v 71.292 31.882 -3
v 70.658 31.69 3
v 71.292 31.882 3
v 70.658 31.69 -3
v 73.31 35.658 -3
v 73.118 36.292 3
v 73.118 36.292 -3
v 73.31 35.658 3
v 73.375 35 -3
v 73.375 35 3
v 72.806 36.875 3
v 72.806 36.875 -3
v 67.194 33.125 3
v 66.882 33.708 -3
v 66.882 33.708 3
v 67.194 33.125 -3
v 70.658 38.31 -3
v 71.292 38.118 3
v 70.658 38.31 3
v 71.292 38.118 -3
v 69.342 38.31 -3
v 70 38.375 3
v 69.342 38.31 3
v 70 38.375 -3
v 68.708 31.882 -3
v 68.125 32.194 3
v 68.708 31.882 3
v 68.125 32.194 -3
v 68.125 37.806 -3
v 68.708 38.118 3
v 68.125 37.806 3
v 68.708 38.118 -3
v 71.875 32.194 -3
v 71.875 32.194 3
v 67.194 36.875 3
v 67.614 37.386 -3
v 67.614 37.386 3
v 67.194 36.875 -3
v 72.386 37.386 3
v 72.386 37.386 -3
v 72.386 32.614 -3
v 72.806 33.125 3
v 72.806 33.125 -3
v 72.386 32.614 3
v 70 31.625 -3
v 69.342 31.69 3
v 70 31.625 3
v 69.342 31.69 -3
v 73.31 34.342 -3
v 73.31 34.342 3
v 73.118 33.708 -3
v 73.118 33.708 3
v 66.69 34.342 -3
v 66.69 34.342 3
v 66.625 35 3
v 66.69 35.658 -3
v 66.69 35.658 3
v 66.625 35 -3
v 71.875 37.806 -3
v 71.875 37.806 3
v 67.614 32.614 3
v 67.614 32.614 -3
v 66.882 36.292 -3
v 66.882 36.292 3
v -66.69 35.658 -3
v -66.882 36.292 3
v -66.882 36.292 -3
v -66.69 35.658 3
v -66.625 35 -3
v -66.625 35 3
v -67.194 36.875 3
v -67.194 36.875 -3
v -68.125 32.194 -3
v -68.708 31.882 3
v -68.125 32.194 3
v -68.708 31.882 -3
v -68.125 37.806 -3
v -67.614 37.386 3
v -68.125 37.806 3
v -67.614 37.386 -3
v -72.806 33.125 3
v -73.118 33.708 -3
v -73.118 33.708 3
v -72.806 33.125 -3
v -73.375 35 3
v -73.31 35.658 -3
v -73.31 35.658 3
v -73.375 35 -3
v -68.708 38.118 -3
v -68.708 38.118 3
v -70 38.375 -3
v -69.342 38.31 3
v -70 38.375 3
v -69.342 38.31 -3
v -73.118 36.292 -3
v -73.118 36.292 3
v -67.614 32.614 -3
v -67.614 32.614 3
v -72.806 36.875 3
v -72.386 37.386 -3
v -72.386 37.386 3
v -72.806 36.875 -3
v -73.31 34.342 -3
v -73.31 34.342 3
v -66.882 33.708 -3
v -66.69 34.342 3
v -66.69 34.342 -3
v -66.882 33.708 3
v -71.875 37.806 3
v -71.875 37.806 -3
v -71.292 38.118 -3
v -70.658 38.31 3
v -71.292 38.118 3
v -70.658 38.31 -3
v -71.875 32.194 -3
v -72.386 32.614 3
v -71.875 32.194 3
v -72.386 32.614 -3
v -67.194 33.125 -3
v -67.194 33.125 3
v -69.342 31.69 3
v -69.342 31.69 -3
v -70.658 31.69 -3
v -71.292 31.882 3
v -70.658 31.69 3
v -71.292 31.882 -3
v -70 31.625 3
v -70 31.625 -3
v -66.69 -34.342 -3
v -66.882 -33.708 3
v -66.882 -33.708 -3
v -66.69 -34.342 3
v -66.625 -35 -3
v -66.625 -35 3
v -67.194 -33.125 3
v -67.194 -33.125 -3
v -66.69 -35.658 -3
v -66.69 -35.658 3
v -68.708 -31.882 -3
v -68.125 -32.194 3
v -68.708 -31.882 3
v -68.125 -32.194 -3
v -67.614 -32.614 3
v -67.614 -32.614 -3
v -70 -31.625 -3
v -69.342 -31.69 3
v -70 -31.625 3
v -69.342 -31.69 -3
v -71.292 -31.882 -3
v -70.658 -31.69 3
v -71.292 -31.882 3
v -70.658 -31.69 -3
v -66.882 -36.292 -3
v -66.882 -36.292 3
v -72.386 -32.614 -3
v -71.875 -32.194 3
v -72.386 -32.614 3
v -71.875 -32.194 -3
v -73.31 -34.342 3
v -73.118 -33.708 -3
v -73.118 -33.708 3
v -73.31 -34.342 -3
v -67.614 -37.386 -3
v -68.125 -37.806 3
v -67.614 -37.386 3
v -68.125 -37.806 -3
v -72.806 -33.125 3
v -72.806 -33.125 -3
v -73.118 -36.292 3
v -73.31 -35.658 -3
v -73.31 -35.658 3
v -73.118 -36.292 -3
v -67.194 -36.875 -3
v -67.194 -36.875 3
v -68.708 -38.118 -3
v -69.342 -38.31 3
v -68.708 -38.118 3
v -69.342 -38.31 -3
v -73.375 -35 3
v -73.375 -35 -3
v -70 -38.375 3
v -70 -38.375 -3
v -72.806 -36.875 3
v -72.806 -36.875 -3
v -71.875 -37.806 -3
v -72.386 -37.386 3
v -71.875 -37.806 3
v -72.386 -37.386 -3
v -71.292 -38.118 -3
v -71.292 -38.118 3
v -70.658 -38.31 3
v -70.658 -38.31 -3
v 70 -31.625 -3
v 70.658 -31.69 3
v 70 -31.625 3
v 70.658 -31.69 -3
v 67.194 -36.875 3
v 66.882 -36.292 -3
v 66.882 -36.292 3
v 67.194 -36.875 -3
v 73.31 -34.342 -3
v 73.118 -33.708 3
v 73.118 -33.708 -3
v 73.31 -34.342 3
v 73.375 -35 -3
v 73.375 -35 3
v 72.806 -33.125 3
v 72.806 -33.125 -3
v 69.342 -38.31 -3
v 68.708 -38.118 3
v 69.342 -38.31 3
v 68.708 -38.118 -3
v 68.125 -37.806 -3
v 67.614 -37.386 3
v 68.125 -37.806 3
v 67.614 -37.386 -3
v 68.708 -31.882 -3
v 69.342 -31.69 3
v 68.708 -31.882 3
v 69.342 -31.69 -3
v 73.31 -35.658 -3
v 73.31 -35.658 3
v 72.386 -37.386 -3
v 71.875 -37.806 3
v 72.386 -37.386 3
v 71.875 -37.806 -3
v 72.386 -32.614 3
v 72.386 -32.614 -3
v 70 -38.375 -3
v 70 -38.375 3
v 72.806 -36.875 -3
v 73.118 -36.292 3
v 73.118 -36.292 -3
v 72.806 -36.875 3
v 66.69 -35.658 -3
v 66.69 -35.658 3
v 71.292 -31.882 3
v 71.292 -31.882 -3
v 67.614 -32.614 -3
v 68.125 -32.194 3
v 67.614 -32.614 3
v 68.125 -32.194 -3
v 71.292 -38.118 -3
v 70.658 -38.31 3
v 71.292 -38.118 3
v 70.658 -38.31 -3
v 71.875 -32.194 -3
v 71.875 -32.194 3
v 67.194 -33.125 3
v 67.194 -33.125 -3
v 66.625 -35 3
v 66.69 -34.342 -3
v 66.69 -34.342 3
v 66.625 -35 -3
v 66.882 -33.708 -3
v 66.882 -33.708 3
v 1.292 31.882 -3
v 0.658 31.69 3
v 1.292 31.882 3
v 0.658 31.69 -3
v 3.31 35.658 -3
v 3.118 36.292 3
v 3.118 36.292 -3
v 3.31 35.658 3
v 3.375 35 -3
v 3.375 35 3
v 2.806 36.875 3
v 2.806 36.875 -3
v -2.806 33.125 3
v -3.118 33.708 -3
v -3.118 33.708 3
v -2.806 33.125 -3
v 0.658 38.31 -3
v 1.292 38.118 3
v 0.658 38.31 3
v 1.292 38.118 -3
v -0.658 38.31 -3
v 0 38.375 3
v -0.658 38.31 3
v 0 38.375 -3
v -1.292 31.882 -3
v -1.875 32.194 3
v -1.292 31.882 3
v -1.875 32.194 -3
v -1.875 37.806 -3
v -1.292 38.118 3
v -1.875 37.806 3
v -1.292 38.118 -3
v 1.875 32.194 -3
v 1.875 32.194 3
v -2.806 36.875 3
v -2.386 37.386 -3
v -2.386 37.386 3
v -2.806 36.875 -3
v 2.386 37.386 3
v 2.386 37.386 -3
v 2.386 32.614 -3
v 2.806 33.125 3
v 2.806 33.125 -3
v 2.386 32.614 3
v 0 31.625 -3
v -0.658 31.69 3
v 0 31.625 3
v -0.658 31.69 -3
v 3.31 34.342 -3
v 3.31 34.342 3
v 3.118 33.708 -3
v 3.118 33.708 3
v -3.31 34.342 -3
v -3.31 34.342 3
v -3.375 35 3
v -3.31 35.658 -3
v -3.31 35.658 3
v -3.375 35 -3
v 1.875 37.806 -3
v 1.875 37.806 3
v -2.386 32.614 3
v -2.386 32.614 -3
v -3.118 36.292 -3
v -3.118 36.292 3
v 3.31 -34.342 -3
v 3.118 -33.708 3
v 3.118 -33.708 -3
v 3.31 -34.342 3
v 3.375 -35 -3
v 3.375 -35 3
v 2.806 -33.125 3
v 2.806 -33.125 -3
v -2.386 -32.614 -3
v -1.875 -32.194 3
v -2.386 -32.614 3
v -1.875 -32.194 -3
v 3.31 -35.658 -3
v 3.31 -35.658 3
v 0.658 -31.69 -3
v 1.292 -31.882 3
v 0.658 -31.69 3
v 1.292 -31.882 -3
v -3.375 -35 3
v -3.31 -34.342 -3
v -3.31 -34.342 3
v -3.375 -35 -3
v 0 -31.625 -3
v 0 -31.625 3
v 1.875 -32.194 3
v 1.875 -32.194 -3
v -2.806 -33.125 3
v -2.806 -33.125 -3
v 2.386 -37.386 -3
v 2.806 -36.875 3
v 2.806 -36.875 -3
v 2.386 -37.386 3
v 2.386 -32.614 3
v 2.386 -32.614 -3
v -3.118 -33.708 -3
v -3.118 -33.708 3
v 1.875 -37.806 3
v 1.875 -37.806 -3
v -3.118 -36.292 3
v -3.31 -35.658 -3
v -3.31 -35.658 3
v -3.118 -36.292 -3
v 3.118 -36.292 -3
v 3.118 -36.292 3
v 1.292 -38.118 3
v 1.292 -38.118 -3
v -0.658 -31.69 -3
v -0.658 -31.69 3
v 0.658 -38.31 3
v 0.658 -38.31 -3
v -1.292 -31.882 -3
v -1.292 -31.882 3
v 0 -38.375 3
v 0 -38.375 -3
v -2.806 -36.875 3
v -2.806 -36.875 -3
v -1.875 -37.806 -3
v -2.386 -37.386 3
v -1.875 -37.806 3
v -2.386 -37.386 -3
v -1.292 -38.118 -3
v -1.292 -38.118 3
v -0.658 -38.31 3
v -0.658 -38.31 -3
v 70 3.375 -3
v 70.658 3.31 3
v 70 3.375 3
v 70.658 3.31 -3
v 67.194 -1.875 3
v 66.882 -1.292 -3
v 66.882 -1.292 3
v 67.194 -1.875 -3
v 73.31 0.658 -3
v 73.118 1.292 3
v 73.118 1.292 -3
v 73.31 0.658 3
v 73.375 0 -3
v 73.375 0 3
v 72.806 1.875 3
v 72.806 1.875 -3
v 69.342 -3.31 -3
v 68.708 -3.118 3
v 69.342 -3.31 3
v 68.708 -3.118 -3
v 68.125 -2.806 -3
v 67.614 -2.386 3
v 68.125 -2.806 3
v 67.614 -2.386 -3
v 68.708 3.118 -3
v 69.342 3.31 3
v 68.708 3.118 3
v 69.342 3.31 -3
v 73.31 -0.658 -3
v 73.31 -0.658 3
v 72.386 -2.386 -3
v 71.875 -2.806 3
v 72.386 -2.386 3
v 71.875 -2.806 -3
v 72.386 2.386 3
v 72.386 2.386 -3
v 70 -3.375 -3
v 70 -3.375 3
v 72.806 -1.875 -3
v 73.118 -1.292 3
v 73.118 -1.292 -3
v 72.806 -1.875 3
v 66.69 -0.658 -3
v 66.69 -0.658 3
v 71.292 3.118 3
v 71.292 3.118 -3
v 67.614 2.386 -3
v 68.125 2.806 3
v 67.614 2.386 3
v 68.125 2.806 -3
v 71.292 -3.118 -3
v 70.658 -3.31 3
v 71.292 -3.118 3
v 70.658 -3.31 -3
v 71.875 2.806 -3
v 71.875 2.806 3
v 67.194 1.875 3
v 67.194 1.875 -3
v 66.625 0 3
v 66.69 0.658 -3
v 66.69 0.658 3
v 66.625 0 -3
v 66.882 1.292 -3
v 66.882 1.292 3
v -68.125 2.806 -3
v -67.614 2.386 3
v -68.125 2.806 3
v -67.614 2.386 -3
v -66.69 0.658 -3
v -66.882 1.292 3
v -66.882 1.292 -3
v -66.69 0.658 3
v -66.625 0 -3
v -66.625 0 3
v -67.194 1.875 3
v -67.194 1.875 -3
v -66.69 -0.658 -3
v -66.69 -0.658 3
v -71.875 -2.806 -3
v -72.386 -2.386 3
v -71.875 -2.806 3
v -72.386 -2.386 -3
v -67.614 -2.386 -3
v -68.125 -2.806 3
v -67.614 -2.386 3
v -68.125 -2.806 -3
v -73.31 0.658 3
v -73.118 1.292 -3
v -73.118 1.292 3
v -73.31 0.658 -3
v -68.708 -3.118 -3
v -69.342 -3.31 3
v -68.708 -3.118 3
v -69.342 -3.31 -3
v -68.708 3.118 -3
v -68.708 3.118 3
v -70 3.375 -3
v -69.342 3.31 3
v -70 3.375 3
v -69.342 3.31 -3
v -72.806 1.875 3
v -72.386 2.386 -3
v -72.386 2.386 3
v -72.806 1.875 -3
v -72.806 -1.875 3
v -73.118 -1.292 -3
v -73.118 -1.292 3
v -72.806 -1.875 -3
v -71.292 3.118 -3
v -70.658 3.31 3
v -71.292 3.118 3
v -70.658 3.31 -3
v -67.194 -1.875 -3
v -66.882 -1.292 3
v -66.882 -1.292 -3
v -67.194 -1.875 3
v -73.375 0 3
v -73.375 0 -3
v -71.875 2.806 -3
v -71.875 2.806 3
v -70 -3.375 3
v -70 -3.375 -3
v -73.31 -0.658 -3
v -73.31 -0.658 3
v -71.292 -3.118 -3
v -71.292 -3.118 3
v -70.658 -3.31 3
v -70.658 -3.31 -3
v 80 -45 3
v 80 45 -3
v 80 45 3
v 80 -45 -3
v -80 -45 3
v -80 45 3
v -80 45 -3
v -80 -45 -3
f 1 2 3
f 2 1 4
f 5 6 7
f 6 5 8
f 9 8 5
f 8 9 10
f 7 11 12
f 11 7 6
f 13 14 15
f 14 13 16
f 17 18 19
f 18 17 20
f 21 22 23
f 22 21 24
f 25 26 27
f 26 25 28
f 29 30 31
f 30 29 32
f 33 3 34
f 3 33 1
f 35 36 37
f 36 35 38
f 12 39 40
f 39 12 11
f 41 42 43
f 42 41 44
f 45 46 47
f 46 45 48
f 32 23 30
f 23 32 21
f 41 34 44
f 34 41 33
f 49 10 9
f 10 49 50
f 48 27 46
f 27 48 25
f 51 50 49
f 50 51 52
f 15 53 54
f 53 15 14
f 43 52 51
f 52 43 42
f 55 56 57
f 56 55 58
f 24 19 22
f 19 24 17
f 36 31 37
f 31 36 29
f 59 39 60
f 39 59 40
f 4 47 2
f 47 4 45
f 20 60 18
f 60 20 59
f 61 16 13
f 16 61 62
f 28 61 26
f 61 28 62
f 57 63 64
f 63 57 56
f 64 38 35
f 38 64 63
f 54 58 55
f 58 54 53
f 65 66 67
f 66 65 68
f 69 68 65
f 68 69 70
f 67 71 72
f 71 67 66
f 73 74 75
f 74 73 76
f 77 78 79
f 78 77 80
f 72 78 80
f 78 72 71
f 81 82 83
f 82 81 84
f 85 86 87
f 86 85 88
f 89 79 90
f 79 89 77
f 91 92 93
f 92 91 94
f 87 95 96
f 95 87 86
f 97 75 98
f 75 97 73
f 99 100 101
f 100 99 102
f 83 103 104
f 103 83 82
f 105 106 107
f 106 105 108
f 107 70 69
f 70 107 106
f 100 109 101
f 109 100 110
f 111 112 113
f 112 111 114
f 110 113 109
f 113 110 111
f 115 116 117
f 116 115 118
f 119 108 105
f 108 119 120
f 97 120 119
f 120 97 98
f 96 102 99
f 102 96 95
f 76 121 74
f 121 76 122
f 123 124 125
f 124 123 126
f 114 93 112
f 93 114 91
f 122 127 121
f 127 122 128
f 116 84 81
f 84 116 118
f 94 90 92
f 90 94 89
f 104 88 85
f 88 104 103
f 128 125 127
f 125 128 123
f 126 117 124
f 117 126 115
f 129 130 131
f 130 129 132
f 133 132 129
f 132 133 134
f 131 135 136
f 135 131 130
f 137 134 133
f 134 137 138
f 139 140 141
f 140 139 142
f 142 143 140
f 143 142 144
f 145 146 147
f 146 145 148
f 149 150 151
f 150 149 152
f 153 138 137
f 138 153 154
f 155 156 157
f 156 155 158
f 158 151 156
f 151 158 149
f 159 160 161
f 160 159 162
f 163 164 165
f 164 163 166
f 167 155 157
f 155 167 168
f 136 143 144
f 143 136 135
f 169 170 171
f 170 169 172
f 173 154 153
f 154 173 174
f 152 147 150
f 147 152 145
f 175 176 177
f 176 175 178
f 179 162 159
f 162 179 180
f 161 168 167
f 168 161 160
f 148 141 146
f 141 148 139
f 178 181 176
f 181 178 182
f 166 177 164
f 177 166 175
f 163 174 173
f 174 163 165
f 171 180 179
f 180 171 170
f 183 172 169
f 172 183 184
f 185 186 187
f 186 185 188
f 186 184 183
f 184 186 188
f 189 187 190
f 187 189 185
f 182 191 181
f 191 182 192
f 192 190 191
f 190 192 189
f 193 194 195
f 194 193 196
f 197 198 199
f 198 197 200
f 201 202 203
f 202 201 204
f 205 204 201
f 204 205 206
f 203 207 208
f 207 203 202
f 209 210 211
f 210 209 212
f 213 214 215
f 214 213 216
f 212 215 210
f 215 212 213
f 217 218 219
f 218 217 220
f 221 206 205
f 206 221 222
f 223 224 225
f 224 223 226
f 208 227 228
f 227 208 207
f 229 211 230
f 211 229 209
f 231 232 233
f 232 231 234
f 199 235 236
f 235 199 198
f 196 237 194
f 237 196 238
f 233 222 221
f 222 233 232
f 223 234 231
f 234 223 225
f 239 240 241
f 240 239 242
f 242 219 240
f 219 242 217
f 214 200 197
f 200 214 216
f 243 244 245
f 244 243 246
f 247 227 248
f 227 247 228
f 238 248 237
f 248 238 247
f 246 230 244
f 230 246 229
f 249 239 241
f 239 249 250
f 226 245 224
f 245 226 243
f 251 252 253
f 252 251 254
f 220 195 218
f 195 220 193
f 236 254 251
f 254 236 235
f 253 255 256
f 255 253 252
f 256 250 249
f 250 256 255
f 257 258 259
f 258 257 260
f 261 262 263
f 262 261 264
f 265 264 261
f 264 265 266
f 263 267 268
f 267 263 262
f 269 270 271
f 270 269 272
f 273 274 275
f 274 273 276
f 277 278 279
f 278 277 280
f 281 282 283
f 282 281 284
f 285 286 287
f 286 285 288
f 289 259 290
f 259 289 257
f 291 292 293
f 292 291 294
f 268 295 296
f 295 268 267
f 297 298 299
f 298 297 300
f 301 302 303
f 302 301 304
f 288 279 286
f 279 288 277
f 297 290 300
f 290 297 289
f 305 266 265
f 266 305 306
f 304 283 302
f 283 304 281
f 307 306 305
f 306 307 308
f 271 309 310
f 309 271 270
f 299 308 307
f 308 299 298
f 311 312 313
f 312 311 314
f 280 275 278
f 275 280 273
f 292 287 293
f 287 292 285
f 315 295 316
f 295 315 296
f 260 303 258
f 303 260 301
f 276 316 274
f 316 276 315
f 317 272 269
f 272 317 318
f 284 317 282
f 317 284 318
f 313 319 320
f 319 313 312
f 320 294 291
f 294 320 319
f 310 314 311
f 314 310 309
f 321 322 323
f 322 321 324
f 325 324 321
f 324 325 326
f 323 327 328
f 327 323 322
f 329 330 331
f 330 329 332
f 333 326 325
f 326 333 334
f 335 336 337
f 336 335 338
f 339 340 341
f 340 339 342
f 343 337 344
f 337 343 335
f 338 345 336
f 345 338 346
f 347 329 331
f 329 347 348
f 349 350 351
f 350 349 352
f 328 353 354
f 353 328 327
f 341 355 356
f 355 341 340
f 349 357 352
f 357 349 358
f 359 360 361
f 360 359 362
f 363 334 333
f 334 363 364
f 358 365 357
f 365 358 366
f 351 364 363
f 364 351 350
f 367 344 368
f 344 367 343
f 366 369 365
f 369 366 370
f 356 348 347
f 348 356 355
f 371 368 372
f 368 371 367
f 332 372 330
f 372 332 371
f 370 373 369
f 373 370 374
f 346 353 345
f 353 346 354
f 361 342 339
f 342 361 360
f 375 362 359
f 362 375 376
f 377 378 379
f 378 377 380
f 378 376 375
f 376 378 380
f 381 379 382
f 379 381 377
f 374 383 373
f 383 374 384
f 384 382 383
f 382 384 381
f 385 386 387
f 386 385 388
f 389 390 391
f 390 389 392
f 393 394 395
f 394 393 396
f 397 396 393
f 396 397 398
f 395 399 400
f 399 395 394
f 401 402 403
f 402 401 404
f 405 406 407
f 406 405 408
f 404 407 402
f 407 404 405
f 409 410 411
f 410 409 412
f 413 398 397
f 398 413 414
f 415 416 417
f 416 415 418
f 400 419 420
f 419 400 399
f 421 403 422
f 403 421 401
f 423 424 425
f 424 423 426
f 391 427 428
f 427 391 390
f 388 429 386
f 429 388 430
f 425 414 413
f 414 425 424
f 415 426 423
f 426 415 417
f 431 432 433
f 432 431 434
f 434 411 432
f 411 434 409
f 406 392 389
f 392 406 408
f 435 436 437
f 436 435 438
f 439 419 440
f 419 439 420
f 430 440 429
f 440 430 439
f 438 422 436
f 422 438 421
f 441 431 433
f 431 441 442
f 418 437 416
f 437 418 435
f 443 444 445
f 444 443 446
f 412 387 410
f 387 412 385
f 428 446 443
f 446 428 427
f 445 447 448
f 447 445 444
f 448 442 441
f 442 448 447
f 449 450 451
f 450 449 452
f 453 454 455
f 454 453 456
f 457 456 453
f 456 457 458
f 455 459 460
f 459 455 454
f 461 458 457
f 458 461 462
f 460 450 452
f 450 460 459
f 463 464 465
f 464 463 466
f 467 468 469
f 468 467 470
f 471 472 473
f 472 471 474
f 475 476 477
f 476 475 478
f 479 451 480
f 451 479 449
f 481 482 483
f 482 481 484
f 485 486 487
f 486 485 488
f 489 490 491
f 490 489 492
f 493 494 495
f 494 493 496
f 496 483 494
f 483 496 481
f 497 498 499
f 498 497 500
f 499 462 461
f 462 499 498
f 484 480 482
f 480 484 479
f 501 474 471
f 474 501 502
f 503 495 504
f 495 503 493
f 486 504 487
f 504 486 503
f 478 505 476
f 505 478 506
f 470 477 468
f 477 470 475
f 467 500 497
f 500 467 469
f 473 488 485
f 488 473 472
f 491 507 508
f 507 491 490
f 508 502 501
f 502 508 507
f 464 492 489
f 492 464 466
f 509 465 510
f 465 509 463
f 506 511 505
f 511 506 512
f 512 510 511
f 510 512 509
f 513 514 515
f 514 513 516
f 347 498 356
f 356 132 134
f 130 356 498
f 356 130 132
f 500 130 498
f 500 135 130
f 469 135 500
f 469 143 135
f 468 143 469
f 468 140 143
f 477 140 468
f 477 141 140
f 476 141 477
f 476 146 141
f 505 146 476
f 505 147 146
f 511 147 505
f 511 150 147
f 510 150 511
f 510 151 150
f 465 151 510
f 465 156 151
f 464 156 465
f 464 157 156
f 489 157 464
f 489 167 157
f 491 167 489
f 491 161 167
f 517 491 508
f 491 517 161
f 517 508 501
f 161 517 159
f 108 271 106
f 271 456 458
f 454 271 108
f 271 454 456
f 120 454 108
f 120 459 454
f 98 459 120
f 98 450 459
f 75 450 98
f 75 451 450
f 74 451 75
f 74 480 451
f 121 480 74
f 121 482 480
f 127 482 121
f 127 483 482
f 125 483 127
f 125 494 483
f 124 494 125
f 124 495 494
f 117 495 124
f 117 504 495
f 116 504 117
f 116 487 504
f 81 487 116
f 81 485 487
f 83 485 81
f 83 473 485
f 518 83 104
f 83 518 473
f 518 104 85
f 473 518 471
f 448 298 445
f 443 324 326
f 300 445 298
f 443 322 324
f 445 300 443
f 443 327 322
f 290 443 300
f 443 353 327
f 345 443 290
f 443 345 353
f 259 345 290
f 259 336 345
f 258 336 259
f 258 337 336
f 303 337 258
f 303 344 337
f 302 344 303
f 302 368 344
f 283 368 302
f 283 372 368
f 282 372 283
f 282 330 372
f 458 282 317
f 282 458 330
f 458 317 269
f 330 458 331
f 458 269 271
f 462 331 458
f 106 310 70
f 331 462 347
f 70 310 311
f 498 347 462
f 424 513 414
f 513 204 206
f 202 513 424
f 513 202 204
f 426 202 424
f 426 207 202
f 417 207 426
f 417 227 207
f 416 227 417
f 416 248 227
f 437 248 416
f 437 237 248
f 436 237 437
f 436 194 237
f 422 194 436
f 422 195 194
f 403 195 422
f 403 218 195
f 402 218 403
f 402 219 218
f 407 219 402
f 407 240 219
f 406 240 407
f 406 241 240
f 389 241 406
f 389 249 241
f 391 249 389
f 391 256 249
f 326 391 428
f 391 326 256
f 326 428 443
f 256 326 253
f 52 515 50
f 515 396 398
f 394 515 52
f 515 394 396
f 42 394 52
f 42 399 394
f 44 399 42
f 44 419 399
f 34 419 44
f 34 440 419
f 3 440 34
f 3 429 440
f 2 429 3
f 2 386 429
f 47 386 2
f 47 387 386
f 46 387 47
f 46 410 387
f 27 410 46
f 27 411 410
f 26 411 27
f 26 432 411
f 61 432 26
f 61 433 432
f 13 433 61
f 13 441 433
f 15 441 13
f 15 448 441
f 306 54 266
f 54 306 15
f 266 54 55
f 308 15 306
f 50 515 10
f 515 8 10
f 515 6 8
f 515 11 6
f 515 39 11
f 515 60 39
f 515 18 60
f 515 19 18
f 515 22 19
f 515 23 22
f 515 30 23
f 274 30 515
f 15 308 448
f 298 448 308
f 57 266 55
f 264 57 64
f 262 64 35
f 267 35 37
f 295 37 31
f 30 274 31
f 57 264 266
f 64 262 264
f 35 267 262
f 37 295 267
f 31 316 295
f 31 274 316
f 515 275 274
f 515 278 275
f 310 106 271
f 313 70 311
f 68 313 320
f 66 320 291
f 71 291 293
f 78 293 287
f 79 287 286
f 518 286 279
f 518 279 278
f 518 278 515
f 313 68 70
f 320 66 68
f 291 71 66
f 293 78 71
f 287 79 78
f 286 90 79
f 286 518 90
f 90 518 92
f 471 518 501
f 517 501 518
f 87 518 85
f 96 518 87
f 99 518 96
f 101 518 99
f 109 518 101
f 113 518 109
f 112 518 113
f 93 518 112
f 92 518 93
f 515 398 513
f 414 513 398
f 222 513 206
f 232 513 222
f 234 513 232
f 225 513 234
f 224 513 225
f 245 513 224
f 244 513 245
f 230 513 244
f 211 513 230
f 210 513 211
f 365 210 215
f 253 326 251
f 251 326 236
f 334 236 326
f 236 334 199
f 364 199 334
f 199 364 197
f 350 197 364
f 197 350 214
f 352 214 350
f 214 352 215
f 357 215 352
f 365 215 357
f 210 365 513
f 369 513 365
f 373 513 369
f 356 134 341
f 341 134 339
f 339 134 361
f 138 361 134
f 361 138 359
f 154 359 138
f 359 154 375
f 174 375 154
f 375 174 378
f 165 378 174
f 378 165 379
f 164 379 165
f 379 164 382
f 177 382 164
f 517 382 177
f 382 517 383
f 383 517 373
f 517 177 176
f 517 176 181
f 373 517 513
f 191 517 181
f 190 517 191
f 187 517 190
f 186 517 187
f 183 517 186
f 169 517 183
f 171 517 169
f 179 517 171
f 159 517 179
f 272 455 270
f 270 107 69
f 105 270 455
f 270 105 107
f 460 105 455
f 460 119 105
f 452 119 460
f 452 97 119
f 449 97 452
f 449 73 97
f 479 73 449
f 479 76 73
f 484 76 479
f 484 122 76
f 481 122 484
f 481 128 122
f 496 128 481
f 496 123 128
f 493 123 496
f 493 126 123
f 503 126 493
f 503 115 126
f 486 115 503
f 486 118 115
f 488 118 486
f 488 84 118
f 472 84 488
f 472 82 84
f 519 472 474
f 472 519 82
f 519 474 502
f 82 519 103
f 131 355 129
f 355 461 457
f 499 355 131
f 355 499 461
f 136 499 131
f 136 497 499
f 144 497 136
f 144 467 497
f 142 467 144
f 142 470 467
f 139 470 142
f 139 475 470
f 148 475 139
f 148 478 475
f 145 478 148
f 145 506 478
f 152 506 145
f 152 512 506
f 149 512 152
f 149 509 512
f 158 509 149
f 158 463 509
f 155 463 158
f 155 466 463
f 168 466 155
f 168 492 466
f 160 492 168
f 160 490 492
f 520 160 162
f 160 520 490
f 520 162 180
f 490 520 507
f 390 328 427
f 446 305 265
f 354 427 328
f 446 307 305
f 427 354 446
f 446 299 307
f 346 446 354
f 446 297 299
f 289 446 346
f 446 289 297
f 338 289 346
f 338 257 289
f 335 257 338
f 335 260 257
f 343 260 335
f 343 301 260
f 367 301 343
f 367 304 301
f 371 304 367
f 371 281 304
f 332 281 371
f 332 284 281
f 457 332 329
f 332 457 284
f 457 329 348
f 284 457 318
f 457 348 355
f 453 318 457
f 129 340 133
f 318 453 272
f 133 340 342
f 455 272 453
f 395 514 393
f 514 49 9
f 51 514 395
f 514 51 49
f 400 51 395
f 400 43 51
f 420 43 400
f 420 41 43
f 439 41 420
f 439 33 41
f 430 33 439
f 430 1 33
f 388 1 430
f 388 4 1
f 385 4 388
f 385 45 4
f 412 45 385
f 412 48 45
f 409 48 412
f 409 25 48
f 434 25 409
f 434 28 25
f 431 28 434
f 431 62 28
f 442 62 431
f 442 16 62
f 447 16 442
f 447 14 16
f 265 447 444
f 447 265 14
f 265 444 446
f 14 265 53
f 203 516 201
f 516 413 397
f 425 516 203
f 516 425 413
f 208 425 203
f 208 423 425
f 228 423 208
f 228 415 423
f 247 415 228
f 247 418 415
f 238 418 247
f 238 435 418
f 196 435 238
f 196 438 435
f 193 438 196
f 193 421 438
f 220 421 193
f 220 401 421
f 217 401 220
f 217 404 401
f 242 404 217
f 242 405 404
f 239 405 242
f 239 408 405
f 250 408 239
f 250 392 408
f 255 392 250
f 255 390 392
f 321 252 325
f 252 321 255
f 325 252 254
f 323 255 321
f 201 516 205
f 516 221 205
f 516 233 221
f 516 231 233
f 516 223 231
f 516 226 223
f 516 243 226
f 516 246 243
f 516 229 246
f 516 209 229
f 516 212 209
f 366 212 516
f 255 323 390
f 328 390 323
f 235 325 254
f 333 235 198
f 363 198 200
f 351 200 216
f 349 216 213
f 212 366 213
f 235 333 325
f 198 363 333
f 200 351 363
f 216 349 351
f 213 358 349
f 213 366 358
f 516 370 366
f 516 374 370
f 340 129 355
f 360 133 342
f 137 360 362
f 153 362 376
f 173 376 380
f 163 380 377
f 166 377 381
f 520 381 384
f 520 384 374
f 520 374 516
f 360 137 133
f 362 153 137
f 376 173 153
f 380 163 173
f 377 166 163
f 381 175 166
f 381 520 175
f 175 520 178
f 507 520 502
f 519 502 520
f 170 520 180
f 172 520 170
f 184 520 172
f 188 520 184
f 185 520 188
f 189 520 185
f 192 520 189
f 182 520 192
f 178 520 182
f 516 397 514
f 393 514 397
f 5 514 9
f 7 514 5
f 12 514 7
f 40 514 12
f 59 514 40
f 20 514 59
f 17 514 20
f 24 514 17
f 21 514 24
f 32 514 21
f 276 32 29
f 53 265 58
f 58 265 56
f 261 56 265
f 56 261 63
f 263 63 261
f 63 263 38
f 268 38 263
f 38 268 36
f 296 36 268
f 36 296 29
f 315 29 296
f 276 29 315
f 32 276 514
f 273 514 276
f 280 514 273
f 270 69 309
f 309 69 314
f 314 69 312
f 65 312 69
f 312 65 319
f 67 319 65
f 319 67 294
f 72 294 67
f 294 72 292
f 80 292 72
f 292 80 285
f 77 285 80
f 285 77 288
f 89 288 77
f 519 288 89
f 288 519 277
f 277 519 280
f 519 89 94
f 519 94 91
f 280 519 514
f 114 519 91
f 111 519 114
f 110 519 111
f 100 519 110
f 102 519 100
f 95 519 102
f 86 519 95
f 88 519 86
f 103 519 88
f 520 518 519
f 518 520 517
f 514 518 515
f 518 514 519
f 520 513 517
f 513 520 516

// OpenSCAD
$fn = 32;

// ----------------------------------------------------------------------
// Corner plate 160 x 90 x 6
// 8 holes, centres taken from the edge offset
// ----------------------------------------------------------------------

// --- parameters (mm) ---
plate = [160, 90, 6];    // overall size (x, y, z)
holes = 8;               // number of holes the drawing asks for
bore_d = 6.6;            // nominal hole diameter from the drawing
print_allowance = 0.15;  // clearance added for printing
edge = 10;               // hole centre offset from the plate edge

// --- derived feature positions (mm) ---
hole_d = bore_d + print_allowance;  // = 6.75   hole diameter as printed
corner_x = plate[0] / 2 - edge;     // = 70   corner hole X
corner_y = plate[1] / 2 - edge;     // = 35   corner hole Y
feature_centers = [
  [corner_x, corner_y],
  [-corner_x, corner_y],
  [-corner_x, -corner_y],
  [corner_x, -corner_y],
  [0, corner_y],
  [0, -corner_y],
  [corner_x, 0],
  [-corner_x, 0]
];   // hole centres the loop below drills

// plate outline, every hole drilled through with the same cutters
difference() {
  cube(plate, center = true);
  for (centre = feature_centers)
    translate([centre[0], centre[1], 0])
      cylinder(d = hole_d, h = plate[2] + 2, center = true);
}
